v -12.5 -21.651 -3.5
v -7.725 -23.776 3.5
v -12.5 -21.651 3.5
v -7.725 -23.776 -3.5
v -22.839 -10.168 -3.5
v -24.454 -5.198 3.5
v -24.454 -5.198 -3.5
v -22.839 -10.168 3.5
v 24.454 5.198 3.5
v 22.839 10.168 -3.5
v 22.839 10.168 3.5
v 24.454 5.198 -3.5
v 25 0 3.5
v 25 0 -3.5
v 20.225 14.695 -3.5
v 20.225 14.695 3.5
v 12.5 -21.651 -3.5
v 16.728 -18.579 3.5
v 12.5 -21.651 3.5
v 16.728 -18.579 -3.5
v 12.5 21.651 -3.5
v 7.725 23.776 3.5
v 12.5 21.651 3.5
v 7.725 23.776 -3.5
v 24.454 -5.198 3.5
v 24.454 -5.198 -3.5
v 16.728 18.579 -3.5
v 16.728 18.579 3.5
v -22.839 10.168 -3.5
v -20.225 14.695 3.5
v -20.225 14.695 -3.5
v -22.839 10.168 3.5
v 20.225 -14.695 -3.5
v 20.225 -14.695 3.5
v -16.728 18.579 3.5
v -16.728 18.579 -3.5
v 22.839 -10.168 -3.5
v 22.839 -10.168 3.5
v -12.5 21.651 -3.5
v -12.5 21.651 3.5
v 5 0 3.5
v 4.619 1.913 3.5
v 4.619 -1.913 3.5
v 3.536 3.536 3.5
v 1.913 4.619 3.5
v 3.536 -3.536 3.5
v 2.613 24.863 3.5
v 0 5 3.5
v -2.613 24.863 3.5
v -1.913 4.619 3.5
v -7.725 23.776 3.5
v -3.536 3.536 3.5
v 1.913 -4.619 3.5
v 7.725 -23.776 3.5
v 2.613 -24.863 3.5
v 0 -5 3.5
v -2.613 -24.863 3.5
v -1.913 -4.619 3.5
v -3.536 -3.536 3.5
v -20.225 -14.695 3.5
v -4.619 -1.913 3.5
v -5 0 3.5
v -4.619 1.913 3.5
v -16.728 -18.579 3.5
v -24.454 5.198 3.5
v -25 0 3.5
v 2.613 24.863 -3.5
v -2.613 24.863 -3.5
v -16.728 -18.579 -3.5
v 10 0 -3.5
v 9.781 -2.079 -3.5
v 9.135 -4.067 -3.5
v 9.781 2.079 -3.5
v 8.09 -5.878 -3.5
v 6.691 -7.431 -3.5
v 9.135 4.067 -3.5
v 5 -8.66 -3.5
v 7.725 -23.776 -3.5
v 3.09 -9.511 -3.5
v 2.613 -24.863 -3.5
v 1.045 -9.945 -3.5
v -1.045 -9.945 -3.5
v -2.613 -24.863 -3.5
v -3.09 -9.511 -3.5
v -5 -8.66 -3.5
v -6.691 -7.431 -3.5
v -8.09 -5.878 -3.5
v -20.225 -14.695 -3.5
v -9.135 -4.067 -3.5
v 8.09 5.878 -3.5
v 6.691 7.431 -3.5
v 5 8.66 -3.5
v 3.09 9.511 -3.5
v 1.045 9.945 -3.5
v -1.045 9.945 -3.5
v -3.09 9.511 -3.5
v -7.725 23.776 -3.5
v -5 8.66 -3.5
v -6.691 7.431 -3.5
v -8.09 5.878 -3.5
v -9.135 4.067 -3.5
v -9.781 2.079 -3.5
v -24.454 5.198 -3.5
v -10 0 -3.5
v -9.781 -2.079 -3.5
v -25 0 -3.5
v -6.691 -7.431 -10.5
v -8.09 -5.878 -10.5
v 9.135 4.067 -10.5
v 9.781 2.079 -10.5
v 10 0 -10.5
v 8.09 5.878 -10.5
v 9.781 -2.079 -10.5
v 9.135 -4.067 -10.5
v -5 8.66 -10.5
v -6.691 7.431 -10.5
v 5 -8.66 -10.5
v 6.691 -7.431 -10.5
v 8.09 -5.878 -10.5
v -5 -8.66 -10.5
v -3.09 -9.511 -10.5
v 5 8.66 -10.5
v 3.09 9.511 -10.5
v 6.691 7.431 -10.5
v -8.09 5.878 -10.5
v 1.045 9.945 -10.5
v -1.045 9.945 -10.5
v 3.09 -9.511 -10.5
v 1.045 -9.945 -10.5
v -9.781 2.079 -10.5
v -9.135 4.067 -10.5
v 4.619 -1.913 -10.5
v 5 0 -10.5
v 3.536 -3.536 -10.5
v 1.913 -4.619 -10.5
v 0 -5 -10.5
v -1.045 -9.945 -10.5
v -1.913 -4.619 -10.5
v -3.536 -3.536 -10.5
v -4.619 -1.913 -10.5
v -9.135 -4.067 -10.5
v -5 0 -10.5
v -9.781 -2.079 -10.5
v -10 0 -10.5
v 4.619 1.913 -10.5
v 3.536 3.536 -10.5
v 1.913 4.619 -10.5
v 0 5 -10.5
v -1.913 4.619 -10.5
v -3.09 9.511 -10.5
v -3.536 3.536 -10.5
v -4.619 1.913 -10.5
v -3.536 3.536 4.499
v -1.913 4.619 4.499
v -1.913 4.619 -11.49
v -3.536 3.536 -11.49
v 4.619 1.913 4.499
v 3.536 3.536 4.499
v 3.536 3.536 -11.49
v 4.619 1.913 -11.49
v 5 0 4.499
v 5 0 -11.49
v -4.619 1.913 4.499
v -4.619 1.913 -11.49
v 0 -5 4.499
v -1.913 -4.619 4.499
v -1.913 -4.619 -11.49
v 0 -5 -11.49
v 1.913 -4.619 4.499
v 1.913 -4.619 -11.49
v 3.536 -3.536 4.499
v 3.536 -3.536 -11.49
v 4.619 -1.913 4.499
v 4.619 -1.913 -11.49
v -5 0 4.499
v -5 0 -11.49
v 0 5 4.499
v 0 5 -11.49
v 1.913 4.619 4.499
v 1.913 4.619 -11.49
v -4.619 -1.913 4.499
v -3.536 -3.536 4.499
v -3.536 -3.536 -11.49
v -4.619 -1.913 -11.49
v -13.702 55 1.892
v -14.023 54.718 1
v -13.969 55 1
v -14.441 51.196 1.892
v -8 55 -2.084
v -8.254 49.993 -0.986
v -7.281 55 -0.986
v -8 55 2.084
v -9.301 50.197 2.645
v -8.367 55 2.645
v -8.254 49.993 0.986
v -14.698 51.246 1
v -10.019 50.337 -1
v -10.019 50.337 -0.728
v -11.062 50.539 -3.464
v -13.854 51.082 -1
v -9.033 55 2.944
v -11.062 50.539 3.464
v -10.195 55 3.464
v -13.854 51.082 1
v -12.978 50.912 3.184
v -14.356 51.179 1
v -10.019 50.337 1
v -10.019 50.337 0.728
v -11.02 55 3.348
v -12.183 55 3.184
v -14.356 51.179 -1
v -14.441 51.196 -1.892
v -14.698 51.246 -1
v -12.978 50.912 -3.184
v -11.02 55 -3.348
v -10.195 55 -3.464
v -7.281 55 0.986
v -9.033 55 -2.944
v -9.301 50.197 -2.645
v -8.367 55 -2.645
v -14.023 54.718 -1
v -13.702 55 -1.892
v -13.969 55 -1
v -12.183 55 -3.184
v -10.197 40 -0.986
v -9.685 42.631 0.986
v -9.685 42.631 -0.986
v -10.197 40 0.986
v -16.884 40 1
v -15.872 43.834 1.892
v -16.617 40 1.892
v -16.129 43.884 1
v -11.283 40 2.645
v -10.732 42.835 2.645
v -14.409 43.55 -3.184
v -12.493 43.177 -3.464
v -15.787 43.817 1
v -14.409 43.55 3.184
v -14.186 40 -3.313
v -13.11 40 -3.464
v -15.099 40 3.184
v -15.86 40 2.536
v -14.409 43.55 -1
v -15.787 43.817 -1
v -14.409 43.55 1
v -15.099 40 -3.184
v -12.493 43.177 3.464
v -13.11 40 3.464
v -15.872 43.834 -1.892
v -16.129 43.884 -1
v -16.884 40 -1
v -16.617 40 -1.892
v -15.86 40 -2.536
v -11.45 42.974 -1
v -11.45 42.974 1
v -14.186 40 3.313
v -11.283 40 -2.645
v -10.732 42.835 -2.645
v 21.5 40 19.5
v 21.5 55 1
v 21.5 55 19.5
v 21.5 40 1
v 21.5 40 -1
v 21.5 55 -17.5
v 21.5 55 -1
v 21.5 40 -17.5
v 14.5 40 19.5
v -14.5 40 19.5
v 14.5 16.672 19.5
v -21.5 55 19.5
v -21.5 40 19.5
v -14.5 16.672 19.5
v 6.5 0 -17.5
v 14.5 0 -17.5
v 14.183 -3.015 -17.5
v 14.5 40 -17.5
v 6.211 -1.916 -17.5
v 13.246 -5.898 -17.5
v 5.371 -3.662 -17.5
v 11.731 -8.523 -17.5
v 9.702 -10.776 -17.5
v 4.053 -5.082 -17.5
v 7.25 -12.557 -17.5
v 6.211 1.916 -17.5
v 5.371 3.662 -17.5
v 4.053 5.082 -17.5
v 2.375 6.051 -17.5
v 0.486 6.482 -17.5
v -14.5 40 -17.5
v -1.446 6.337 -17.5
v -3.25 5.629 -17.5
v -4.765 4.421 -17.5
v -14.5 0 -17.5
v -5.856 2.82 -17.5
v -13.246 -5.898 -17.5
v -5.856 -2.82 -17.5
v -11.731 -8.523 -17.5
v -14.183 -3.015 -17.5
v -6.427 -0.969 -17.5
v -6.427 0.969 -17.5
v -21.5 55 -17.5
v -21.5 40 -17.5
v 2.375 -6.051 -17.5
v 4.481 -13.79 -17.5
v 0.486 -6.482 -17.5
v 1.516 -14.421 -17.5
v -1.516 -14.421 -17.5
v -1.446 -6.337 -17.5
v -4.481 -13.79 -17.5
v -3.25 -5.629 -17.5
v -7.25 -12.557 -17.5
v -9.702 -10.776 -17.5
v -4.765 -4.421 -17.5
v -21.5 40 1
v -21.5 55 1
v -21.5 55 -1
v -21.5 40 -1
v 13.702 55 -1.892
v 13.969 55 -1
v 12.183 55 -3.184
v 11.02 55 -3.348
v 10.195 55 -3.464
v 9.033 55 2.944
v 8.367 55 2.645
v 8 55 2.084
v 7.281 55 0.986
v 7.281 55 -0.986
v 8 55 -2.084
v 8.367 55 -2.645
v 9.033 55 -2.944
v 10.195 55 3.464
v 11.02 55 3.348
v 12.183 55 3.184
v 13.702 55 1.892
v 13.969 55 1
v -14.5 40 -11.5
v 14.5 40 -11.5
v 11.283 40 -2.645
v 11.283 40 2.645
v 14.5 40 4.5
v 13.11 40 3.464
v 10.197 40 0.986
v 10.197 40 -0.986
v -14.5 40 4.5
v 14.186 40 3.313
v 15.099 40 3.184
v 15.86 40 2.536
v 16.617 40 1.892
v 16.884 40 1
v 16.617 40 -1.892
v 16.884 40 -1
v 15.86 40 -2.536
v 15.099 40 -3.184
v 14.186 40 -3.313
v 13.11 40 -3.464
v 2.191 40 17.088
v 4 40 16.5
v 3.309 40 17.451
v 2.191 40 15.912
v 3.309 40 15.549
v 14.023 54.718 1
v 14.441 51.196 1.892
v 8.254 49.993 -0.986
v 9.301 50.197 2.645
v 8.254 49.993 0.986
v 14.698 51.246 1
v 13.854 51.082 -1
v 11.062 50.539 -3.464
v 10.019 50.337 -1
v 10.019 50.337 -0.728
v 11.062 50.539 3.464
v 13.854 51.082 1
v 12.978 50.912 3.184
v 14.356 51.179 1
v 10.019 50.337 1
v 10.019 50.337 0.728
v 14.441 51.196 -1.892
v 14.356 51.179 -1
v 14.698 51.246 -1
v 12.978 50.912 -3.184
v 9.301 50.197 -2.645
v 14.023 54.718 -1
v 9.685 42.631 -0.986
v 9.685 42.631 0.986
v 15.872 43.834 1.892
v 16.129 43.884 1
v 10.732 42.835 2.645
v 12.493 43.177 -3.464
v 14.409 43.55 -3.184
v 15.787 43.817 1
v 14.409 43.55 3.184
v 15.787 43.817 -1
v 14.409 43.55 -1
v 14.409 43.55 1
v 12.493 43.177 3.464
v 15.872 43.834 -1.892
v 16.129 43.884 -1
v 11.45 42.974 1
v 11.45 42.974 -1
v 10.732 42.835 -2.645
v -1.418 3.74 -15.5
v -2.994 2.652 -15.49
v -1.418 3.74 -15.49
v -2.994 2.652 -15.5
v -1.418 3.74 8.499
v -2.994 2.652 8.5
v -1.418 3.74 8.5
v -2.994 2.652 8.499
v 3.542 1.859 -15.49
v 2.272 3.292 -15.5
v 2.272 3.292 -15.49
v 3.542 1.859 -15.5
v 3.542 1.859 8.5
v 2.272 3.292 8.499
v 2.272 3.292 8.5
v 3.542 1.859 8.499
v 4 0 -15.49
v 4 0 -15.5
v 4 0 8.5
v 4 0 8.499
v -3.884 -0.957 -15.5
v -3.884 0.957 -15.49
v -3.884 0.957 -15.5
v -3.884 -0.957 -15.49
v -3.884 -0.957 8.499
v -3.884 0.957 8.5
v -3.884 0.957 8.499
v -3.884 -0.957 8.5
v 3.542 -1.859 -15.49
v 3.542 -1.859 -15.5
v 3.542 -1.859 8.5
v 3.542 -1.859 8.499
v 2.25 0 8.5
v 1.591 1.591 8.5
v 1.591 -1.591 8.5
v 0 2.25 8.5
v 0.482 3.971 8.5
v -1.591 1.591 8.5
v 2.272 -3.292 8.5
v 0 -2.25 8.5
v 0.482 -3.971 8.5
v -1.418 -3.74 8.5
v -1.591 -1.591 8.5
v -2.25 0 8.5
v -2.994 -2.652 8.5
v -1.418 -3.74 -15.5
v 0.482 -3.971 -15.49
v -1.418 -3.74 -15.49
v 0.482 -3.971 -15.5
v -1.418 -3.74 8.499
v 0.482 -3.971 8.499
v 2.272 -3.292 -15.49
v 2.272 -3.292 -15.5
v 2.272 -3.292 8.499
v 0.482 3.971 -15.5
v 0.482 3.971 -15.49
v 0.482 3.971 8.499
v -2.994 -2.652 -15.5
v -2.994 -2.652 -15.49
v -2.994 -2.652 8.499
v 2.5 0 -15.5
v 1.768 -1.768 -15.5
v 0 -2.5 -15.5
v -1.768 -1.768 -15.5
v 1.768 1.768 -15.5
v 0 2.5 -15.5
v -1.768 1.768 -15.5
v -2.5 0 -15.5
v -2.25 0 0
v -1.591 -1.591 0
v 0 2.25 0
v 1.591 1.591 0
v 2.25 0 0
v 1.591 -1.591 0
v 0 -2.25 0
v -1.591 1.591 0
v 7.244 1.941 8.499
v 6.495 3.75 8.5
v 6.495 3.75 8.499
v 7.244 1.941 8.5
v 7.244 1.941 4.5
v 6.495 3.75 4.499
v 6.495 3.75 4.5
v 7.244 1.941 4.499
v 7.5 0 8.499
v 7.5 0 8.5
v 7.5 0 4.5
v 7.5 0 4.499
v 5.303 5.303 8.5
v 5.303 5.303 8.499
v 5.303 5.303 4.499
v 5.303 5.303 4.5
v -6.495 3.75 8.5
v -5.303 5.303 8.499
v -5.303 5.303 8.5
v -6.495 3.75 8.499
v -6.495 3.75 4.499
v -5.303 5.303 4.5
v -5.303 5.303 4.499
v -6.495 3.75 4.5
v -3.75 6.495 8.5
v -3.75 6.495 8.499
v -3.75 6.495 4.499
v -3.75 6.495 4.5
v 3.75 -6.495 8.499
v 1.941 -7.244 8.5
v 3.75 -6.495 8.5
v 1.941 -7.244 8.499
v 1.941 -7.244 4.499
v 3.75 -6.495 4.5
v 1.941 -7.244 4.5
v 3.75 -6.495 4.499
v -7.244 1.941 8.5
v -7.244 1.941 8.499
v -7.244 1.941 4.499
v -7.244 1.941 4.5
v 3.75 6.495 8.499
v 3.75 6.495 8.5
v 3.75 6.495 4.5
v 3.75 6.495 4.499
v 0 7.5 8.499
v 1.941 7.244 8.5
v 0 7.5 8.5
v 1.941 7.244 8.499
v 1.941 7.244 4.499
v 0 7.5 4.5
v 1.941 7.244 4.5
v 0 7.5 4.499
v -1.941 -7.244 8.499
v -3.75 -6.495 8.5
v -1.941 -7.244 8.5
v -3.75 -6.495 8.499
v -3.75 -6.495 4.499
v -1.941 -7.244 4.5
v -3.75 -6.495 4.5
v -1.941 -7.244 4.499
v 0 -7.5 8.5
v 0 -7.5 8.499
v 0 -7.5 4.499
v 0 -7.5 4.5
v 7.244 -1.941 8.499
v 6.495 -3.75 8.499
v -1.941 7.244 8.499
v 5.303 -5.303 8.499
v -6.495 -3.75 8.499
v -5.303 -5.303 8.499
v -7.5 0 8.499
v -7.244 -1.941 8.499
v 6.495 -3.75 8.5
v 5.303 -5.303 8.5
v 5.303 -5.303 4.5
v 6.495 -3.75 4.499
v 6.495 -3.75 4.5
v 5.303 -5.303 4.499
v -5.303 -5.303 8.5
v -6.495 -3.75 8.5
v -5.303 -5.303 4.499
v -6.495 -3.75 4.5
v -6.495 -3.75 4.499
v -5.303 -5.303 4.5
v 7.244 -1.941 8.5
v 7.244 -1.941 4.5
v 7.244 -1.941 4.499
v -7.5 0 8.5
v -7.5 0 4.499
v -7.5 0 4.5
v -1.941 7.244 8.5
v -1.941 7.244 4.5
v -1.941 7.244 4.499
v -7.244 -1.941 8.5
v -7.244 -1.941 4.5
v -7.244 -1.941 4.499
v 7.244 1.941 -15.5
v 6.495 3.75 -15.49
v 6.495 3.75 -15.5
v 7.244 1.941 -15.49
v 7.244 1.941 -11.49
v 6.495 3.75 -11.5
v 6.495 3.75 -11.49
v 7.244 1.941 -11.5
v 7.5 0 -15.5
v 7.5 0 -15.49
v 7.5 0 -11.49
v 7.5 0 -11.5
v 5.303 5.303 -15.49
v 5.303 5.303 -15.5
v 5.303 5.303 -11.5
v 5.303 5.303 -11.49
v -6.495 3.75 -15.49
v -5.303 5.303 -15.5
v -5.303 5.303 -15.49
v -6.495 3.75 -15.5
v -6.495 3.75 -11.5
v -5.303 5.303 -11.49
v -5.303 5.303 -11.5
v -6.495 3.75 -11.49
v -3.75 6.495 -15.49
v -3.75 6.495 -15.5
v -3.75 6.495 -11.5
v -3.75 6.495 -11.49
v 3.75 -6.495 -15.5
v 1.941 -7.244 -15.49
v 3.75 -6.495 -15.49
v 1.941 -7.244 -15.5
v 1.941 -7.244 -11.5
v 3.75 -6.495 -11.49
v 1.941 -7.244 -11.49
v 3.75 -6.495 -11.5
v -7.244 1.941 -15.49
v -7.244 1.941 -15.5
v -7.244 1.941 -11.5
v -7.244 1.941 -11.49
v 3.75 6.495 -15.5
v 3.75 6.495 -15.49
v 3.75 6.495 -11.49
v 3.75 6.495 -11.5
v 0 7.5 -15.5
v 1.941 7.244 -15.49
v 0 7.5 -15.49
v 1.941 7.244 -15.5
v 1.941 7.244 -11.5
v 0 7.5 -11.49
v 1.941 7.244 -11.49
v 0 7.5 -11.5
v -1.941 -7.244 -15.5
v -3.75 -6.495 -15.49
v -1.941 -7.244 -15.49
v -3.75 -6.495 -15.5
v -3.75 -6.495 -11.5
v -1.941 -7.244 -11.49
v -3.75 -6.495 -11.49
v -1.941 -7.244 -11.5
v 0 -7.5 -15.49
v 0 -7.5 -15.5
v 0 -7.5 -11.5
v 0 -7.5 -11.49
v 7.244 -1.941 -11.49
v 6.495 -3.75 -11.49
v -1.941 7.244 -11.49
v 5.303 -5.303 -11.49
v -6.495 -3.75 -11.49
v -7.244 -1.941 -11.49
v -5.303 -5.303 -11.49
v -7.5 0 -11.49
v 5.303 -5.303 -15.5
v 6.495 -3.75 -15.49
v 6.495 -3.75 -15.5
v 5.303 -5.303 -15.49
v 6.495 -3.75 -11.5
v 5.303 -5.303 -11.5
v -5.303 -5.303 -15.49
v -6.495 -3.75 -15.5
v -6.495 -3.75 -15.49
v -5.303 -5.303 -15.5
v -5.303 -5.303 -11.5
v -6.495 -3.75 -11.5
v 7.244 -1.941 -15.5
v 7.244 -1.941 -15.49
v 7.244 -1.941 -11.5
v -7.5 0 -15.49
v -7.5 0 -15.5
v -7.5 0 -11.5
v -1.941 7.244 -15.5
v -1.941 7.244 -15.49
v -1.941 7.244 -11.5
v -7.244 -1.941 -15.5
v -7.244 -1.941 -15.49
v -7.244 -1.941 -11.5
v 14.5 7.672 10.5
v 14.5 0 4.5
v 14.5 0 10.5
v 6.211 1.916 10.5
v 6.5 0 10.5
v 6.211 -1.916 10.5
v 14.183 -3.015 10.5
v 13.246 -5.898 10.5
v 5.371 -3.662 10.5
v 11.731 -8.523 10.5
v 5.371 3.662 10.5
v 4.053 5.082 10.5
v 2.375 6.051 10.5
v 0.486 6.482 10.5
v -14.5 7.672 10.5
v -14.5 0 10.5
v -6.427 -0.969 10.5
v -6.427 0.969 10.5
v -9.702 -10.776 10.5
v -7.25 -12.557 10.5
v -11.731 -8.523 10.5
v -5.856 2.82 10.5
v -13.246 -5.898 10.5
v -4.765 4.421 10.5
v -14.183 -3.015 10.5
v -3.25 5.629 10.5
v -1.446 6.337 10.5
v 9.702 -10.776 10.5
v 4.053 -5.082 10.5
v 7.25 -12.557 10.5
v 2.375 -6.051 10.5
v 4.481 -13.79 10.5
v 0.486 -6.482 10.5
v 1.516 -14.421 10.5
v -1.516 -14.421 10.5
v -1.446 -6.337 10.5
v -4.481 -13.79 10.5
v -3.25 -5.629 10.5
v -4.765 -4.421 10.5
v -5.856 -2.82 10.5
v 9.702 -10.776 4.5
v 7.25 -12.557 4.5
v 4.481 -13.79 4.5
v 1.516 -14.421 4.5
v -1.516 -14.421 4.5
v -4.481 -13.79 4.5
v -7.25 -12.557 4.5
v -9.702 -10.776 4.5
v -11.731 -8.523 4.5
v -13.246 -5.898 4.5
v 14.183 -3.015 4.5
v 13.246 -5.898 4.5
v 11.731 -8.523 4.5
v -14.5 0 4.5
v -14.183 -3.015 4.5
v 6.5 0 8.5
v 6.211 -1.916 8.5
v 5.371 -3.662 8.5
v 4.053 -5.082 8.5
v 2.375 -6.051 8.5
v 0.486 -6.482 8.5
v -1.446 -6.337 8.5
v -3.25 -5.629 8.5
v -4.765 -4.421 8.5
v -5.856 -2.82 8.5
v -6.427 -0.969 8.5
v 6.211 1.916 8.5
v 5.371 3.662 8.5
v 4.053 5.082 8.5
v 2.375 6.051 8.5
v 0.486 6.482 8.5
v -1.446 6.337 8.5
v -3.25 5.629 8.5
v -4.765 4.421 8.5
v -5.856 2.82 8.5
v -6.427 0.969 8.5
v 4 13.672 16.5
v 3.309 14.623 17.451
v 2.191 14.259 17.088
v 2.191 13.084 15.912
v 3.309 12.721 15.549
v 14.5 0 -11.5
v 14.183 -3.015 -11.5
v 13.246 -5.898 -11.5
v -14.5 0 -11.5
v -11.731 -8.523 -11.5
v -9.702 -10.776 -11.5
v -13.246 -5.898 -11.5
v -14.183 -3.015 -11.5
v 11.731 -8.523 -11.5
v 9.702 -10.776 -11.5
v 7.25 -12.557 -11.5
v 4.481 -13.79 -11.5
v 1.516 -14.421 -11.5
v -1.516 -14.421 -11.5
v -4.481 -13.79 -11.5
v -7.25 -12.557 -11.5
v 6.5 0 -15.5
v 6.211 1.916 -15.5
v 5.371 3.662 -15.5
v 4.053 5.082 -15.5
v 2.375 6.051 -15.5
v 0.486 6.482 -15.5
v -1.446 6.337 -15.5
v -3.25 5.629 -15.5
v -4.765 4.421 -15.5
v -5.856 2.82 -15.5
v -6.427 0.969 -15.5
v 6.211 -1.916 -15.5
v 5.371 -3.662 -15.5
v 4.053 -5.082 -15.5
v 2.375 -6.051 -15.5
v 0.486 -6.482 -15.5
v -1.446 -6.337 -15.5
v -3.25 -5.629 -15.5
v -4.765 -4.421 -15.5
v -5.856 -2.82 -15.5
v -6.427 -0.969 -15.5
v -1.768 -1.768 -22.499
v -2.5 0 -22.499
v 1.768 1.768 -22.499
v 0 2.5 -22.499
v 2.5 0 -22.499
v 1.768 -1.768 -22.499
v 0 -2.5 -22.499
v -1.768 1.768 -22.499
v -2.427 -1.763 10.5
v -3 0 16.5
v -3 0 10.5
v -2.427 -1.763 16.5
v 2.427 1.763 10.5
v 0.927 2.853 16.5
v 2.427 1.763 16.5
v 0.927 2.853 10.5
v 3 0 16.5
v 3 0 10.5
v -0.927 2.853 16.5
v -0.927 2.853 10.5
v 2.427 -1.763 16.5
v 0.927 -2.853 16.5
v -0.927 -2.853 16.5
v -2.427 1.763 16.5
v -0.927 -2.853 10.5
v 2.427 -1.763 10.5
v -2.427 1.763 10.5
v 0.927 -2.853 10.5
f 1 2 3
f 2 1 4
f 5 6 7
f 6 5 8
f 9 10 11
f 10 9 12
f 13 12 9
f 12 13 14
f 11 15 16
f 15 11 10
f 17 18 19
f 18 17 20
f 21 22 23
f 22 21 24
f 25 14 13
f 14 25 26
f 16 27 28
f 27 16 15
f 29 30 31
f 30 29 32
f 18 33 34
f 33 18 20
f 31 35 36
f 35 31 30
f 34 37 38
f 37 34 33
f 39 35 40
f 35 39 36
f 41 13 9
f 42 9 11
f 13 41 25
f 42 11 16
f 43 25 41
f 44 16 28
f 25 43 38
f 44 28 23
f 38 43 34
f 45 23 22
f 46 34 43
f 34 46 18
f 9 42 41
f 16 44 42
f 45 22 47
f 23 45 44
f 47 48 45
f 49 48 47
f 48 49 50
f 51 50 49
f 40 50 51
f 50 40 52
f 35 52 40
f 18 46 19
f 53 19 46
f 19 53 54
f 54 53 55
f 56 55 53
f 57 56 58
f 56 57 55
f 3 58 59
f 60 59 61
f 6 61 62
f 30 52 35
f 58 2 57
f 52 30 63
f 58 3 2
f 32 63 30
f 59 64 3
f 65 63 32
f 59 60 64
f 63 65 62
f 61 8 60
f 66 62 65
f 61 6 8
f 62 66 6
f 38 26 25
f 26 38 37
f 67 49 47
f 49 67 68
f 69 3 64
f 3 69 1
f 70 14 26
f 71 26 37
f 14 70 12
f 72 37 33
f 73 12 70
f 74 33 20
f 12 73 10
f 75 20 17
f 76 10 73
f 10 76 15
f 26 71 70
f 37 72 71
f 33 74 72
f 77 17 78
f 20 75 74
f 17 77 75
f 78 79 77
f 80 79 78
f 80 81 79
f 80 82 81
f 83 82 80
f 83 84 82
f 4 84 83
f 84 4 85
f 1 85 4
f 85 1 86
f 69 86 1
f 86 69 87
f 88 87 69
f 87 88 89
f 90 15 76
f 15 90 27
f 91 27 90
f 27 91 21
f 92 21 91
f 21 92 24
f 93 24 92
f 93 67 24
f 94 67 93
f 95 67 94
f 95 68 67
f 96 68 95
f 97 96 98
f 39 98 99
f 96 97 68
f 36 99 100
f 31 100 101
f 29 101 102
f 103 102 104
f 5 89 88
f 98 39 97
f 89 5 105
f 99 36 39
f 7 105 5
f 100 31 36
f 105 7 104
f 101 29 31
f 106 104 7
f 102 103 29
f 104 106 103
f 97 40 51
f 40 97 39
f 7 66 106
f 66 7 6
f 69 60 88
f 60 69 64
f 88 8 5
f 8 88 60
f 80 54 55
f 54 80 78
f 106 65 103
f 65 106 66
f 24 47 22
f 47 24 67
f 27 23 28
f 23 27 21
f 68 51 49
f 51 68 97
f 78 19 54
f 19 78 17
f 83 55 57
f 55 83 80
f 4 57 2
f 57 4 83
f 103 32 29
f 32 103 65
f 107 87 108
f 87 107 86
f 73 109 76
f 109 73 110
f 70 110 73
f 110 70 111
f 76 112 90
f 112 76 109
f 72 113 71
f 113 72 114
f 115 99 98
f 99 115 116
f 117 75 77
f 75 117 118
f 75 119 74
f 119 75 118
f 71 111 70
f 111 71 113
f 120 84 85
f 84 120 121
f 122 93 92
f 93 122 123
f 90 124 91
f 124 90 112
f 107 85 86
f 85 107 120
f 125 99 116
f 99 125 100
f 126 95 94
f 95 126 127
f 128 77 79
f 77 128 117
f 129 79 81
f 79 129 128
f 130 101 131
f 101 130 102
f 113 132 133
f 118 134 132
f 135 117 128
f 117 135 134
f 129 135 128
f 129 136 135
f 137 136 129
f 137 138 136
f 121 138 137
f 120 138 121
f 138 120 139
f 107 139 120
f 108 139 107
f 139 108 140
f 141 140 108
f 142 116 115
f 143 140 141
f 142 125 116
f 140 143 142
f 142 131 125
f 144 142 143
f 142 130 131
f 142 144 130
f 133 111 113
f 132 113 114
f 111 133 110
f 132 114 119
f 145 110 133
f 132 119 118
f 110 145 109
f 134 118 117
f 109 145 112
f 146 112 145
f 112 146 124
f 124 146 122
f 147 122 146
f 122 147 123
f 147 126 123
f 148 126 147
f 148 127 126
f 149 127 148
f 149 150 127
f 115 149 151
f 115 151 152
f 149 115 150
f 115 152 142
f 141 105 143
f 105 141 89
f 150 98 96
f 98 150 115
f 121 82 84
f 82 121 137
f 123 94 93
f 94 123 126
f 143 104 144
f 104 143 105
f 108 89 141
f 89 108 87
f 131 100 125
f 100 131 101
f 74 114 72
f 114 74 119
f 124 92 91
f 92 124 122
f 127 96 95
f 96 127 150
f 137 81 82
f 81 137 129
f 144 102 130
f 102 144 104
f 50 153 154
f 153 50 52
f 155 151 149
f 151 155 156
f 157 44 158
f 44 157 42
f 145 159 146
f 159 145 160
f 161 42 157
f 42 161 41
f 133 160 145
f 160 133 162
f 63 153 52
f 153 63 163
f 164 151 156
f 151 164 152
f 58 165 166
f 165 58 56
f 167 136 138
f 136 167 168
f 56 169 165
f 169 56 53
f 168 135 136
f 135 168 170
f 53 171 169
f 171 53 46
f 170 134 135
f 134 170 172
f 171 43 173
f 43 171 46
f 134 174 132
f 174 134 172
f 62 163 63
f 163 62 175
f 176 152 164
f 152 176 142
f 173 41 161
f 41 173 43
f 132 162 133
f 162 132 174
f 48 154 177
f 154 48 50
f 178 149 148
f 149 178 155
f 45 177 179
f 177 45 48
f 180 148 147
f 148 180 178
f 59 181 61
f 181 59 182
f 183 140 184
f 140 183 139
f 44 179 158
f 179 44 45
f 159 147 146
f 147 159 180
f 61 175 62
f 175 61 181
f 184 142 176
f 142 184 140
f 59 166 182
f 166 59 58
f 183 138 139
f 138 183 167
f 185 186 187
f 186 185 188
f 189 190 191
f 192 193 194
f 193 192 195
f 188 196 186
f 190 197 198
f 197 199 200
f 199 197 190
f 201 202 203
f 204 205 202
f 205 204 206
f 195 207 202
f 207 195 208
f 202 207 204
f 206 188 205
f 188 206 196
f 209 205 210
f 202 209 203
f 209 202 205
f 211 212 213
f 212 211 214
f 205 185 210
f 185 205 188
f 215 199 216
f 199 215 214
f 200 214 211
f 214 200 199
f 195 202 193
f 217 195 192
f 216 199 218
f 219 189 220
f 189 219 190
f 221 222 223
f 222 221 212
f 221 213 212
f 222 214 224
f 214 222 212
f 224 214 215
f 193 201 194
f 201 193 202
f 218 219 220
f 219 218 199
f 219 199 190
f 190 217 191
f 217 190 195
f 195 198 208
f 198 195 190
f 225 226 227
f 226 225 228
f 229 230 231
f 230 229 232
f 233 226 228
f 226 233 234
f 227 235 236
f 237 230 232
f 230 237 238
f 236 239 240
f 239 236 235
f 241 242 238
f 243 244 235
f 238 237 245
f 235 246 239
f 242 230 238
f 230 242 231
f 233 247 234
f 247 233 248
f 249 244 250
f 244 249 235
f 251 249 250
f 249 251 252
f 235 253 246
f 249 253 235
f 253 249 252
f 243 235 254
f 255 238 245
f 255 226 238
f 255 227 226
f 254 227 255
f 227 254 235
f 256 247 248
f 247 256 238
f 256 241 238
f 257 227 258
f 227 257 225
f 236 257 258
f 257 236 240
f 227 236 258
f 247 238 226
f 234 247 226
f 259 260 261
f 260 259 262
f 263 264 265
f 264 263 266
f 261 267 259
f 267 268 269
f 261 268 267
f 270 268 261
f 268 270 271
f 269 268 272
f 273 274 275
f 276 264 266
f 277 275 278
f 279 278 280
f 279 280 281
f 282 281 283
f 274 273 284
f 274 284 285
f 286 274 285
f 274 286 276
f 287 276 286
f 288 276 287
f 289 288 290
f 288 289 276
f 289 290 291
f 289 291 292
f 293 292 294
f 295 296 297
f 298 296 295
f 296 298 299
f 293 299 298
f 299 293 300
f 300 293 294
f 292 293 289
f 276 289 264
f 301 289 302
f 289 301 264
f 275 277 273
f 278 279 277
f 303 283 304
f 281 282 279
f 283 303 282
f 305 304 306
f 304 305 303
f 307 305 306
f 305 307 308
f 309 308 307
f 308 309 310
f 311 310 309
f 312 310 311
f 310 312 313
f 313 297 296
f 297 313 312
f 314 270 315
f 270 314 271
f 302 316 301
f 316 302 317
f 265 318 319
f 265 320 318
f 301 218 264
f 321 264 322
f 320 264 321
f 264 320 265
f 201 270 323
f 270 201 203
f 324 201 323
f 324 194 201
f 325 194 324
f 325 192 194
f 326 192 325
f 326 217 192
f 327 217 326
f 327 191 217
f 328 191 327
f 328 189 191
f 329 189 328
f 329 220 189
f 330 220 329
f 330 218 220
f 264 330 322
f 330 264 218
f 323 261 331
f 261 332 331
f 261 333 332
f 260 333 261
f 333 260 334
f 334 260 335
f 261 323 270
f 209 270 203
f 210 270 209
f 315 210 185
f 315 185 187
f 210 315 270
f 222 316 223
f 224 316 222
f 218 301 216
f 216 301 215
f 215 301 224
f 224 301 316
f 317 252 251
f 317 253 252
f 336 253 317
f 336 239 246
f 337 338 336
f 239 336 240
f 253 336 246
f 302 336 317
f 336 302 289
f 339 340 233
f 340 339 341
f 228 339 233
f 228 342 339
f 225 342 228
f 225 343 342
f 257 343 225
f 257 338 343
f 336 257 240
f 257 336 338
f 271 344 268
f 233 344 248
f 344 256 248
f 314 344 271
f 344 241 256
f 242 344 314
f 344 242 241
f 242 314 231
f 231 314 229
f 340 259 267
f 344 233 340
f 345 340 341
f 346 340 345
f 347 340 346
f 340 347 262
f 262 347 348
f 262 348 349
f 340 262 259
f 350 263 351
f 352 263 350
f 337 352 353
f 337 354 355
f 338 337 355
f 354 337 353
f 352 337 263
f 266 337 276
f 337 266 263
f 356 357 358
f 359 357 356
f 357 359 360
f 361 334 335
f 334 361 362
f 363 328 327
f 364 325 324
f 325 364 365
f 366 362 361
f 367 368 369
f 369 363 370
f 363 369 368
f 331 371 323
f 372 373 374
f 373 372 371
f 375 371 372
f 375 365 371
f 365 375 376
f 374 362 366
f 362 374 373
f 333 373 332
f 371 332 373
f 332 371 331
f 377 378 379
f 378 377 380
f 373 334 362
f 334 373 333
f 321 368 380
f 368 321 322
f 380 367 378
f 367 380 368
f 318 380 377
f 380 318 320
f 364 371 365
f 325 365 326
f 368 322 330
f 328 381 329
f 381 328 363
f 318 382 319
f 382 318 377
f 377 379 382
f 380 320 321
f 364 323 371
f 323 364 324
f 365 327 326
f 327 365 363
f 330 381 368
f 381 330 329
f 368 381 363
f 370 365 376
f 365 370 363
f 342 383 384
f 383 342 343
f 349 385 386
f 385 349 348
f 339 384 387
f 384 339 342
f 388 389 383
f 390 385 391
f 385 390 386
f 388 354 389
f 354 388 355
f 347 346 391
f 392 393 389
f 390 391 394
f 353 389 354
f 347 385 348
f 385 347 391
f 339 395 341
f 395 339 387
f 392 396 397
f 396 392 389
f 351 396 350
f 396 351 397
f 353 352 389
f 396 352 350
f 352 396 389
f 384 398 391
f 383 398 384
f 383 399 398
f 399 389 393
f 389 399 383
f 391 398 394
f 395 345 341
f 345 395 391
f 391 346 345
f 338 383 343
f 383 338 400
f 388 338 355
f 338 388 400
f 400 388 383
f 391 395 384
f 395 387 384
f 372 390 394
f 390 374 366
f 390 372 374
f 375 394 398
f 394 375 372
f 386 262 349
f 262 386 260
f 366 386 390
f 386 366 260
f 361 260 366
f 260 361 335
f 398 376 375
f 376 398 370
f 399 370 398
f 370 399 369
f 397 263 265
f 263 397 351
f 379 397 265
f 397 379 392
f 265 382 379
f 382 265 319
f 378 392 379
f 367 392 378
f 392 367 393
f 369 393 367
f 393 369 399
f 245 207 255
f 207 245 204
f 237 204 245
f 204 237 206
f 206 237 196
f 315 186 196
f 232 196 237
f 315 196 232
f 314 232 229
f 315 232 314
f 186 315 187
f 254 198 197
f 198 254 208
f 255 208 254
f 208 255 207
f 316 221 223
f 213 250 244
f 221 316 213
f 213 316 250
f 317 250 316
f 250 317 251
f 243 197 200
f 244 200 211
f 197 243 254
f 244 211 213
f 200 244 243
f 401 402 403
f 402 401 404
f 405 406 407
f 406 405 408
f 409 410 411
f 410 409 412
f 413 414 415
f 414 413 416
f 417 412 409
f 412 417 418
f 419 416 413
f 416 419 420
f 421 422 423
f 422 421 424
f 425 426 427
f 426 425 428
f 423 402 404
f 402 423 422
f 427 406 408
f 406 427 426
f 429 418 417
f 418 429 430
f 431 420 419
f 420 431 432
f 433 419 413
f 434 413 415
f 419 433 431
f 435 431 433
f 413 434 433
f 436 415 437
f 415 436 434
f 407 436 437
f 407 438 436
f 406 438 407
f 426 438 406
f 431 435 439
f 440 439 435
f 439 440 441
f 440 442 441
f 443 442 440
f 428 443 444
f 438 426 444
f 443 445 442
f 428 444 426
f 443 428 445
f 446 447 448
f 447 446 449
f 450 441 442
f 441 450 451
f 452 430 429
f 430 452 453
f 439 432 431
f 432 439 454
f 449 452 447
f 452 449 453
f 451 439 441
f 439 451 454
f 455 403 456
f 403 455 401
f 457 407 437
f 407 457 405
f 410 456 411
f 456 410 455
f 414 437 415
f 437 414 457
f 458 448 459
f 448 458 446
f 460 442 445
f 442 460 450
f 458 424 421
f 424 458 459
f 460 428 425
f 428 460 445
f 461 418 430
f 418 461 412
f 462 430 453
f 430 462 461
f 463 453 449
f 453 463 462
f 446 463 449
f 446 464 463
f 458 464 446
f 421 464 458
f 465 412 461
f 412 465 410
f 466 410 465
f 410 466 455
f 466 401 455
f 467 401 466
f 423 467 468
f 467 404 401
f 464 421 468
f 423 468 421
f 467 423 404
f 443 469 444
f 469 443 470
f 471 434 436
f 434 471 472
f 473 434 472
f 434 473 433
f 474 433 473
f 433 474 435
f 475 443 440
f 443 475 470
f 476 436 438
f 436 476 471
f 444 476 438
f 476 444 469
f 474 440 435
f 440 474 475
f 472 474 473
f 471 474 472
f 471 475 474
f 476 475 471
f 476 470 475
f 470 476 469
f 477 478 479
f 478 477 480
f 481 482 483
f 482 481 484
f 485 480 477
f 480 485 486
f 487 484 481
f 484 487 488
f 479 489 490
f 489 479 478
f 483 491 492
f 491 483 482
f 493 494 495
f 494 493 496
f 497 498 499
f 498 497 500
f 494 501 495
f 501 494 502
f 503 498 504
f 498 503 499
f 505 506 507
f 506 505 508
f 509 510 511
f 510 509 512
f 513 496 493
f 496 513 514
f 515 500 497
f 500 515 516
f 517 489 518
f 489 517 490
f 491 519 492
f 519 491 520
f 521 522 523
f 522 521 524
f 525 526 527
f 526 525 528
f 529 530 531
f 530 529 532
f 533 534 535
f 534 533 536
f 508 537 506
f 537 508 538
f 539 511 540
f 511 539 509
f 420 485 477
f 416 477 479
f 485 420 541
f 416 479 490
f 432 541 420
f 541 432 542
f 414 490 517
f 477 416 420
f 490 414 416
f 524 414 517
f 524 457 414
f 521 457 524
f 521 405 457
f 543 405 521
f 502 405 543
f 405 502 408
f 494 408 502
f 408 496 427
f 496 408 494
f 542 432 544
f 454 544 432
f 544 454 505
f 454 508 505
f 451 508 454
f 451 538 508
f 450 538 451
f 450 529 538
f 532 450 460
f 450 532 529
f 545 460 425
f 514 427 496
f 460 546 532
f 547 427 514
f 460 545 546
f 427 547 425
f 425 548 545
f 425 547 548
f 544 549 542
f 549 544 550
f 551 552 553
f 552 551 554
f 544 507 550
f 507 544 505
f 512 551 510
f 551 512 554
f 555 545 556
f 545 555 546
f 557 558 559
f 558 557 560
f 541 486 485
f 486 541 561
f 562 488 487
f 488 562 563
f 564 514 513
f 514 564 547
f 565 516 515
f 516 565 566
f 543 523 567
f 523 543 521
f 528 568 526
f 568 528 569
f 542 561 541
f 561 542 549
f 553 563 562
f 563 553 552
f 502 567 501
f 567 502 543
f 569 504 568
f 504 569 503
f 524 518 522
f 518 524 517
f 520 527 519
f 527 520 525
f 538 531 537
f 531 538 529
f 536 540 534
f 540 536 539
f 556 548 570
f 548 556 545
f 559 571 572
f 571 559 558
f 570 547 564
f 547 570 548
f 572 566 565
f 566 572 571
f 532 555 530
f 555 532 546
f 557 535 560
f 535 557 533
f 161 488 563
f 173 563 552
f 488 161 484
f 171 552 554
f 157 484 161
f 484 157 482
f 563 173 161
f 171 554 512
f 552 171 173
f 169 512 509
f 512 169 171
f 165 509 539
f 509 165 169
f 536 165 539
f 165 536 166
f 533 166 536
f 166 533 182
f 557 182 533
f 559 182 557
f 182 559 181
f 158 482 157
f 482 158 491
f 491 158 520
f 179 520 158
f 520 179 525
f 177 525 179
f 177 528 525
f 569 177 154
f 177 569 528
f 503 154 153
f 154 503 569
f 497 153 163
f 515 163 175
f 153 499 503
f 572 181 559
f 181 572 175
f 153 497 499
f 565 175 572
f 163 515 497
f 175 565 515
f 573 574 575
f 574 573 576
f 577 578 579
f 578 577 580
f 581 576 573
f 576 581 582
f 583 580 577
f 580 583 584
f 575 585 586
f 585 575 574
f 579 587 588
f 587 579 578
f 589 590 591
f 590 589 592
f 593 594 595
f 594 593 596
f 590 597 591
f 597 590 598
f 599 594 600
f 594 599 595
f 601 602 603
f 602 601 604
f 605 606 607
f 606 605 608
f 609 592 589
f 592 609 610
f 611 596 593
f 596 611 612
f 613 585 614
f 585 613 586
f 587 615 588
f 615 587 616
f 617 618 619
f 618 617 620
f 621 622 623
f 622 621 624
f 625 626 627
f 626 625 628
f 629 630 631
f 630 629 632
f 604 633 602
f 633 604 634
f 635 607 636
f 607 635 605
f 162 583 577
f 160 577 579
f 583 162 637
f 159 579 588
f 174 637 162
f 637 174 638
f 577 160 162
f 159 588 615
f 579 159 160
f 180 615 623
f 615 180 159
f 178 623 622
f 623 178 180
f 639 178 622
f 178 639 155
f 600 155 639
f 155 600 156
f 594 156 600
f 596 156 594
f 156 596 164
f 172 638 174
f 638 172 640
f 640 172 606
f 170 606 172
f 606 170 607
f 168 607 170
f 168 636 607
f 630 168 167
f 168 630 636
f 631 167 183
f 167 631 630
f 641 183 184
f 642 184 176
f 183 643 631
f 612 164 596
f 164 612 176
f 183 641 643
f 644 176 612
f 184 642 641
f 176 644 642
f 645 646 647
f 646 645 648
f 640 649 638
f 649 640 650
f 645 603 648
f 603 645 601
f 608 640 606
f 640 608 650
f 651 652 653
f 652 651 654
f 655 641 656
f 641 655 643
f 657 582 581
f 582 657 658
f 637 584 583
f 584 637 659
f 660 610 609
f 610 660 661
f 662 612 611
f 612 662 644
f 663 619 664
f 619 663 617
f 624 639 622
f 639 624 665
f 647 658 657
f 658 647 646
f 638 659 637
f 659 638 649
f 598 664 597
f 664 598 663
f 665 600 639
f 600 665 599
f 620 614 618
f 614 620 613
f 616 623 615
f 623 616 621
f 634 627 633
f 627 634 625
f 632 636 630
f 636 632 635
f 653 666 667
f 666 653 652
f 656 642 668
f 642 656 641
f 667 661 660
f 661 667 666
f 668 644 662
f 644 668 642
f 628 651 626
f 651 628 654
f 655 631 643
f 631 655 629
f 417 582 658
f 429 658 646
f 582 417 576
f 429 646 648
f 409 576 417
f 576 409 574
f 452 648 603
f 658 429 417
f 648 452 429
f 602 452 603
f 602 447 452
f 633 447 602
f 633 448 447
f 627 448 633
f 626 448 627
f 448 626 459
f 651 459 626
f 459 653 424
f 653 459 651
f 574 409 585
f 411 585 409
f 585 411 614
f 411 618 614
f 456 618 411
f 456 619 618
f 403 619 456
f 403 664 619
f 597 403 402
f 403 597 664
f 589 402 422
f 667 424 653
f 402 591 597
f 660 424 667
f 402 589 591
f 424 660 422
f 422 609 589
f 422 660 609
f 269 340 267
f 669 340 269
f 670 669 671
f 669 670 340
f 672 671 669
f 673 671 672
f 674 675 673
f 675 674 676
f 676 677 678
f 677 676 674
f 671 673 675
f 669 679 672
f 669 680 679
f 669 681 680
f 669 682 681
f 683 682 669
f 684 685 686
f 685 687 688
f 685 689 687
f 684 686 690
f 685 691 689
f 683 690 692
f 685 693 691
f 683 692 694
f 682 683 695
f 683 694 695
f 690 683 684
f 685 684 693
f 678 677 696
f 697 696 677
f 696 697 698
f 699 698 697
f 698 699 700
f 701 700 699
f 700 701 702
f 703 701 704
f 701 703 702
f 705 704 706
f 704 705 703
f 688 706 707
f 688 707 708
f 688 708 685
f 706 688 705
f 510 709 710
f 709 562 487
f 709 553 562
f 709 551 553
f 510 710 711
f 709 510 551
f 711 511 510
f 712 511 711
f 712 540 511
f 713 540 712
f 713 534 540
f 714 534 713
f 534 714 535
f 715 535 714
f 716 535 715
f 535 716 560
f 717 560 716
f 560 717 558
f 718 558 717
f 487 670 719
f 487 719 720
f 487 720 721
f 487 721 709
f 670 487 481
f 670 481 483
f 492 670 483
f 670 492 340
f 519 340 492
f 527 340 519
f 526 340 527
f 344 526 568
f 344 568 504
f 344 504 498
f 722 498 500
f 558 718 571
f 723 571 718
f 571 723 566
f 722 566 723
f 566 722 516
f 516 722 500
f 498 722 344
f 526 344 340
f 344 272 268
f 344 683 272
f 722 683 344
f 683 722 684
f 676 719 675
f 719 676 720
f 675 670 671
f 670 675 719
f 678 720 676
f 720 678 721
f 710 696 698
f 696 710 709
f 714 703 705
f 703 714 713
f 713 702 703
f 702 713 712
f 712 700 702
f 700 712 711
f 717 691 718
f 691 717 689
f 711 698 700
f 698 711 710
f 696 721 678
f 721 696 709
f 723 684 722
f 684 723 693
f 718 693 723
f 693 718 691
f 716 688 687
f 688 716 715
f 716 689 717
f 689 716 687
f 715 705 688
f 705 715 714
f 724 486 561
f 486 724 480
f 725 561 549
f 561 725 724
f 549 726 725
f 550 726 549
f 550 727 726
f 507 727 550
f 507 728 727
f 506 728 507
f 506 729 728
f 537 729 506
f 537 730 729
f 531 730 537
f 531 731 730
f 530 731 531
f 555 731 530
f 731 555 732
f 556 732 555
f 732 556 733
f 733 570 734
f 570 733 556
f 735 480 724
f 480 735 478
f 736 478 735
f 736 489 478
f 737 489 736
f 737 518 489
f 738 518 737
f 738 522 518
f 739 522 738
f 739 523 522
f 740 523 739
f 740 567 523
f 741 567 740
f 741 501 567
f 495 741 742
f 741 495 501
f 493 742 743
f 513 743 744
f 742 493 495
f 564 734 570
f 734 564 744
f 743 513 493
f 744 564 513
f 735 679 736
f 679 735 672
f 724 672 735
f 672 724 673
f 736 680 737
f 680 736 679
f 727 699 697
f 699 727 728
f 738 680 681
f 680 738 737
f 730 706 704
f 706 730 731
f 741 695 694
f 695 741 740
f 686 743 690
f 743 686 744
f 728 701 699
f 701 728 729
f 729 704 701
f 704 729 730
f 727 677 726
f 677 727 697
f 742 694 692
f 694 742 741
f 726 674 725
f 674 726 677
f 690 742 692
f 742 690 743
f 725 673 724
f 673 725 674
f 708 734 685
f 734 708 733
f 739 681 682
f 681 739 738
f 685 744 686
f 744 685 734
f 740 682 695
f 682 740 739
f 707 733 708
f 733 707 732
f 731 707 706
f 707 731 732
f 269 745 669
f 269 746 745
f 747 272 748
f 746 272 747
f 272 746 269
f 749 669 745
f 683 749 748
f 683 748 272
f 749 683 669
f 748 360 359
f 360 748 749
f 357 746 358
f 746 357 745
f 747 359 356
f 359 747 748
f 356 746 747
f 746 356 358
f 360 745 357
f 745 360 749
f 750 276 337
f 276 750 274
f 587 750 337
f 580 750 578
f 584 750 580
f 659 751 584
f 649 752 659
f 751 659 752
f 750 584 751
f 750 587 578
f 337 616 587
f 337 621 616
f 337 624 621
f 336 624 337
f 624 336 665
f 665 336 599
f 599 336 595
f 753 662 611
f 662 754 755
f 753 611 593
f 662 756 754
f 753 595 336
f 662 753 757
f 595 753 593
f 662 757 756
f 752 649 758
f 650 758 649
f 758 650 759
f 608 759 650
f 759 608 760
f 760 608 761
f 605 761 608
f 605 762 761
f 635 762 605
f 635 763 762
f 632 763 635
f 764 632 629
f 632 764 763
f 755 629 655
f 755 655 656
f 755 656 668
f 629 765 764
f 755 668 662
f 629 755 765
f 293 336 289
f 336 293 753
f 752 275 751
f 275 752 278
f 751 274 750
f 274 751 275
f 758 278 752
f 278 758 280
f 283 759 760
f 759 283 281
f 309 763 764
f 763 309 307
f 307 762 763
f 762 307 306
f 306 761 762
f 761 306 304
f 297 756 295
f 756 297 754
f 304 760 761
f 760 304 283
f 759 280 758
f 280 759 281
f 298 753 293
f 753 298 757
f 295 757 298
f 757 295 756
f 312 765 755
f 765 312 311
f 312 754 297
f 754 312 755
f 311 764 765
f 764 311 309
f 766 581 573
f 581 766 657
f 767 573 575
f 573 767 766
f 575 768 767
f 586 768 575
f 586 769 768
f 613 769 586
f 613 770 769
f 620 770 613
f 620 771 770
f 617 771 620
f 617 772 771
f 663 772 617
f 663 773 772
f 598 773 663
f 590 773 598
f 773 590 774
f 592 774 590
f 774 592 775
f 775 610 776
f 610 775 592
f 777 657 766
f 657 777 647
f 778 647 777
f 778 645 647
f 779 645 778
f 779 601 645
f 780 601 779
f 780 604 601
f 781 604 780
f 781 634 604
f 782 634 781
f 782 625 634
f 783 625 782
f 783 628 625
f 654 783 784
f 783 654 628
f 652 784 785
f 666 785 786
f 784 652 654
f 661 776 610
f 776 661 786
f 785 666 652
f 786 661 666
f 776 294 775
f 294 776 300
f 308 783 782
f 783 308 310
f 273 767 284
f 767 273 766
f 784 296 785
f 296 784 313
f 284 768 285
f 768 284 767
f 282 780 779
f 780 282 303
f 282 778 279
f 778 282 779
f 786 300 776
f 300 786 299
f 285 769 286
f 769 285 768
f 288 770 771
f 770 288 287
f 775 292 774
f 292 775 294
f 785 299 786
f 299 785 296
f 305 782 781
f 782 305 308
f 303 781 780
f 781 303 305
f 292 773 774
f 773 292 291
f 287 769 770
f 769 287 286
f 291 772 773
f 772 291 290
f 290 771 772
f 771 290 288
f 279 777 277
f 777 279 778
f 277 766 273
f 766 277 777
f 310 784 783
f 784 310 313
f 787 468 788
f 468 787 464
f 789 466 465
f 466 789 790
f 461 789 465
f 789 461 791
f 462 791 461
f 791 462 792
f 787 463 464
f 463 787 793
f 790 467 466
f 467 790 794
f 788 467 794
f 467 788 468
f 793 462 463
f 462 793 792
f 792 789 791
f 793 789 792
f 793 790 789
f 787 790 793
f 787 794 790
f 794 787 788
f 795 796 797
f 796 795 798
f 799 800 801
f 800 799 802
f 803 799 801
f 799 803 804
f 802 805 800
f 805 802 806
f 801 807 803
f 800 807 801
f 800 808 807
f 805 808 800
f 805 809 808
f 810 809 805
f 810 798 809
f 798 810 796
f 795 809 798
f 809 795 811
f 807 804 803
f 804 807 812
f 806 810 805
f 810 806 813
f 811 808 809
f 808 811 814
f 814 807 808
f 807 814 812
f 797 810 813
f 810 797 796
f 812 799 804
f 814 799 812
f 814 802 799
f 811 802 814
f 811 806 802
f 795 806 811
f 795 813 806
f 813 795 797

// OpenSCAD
screwInsertHoleDiameter = 4.5;

throttleCablePulleyDiameter = 50;
throttleCablePulleyWidth = 7;
throttleCablePulleyAxleDiameter = 10;
throttleCablePulleyAxleExtraHeight = 7;
throttleCablePulleyAxleExtraHeightDiameter = 20;

//pulley
color("grey") difference() {
  union() {
    translate([0,0,-throttleCablePulleyWidth/2]) cylinder(h=throttleCablePulleyWidth, r=throttleCablePulleyDiameter/2);
    translate([0,0,-throttleCablePulleyWidth/2 - throttleCablePulleyAxleExtraHeight]) cylinder(h=throttleCablePulleyWidth+throttleCablePulleyAxleExtraHeight, r=throttleCablePulleyAxleExtraHeightDiameter/2);

  }
  translate([0,0,-throttleCablePulleyWidth/2 - 5]) cylinder(h=throttleCablePulleyWidth + throttleCablePulleyAxleExtraHeight + 10, r=throttleCablePulleyAxleDiameter/2);

}

//cable holders
springHeight = 6;
bearingHeight = 4;
bearingHolderEdgeThickness = 2;
springHolderWireMargin = 3;

throttleCableStopWidth = 43;
throttleCableStopDistance = 40;
throttleCableStopHeight = 15;

throttleCableStopDepth = 100 - (100 - springHeight - 1 - springHolderWireMargin) + 6 + throttleCablePulleyWidth + throttleCablePulleyAxleExtraHeight+ 1+ bearingHeight + bearingHolderEdgeThickness;




difference() {
  translate([-throttleCableStopWidth/2,throttleCableStopDistance,-throttleCableStopDepth + throttleCablePulleyWidth/2 + bearingHeight + bearingHolderEdgeThickness+springHeight + springHolderWireMargin + 1]) cube([throttleCableStopWidth,throttleCableStopHeight,throttleCableStopDepth]);

  innerThrottleCableDiameter = 2;
  outerThrottleCableDiameter = 7;
  throttleCableEntranceAngle = 11;
  throttleCableMargin = 21;
  throttleCableSlotMargin = 13;

  #rotate([90,0,throttleCableEntranceAngle]) translate([throttleCableMargin,0,-throttleCableStopDistance - throttleCableStopHeight ]) cylinder(h=throttleCableStopHeight + 100, r=innerThrottleCableDiameter/2);
  mirror([1,0]) {
    #rotate([90,0,throttleCableEntranceAngle]) translate([throttleCableMargin,0,-throttleCableStopDistance - throttleCableStopHeight ]) cylinder(h=throttleCableStopHeight + 100, r=innerThrottleCableDiameter/2);
  }

  rotate([90,0,throttleCableEntranceAngle]) translate([throttleCableMargin,0,-throttleCableStopDistance - throttleCableStopHeight ]) cylinder(h=throttleCableStopHeight/2, r=outerThrottleCableDiameter/2);
  rotate([90,0,throttleCableEntranceAngle]) translate([throttleCableMargin,0,-throttleCableStopDistance ]) cylinder(h=throttleCableStopHeight/2, r=outerThrottleCableDiameter/2);
  mirror([1,0]) {
    rotate([90,0,throttleCableEntranceAngle]) translate([throttleCableMargin,0,-throttleCableStopDistance - throttleCableStopHeight ]) cylinder(h=throttleCableStopHeight/2, r=outerThrottleCableDiameter/2);
    rotate([90,0,throttleCableEntranceAngle]) translate([throttleCableMargin,0,-throttleCableStopDistance ]) cylinder(h=throttleCableStopHeight/2, r=outerThrottleCableDiameter/2);

  }

  translate([throttleCableSlotMargin,throttleCableStopDistance - 5,-innerThrottleCableDiameter/2]) rotate([0,0,throttleCableEntranceAngle]) cube([20, throttleCableStopHeight + 10, innerThrottleCableDiameter]);
  mirror([1,0]){
    translate([throttleCableSlotMargin,throttleCableStopDistance - 5,-innerThrottleCableDiameter/2]) rotate([0,0,throttleCableEntranceAngle]) cube([20, throttleCableStopHeight + 10, innerThrottleCableDiameter]);
  }
}

module bearing() {
  color("grey") difference() {
    cylinder(h = bearingHeight, r = bearingOuterDiameter/2);
    translate([0,0,-1]) cylinder(h = bearingHeight + 2, r = bearingAxleDiameter/2);
  }
}


//axle
axleHeight = throttleCablePulleyWidth + throttleCablePulleyAxleExtraHeight + 2;
bearingAxleDiameter = 8;
bearingOuterDiameter = 15;

difference() {
  union() {
    translate([0,0,-throttleCablePulleyAxleExtraHeight - throttleCablePulleyWidth/2 - 1]) cylinder(h=axleHeight, r=throttleCablePulleyAxleDiameter/2);
    translate([0,0,-throttleCablePulleyAxleExtraHeight - throttleCablePulleyWidth/2 - 1 - bearingHeight]) cylinder(h=axleHeight + bearingHeight*2, r=bearingAxleDiameter/2);
  }
  translate([0,0,0]) cylinder(h=100, r=screwInsertHoleDiameter/2);

}
sensorAxleDiameter = 5;
sensorAxleHeight = bearingHolderEdgeThickness + 5;
translate([0,0,-sensorAxleHeight - throttleCablePulleyWidth/2 - throttleCablePulleyAxleExtraHeight - 1 - bearingHeight + 0.001]) cylinder(h=sensorAxleHeight, r=sensorAxleDiameter/2);

translate([0,0,throttleCablePulleyWidth/2 + 1 - 0.001]) bearing();
translate([0,0,-bearingHeight - throttleCablePulleyWidth/2 - throttleCablePulleyAxleExtraHeight - 1 + 0.01]) bearing();

//spring
springDiameter = 6;
springBearingMargin = 2;
color("grey") translate([0,0,throttleCablePulleyWidth/2 + 1 + bearingHeight+ springBearingMargin]) cylinder(h=springHeight, r=springDiameter/2);

//bearing holder
holderMargin = 7;
bearingHolderEdgeWidth = 2;
difference() {
  union() {
    translate([-(bearingOuterDiameter + holderMargin * 2)/2,0,throttleCablePulleyWidth/2+1]) cube([bearingOuterDiameter + holderMargin * 2,throttleCableStopDistance  + throttleCableStopHeight,bearingHeight + bearingHolderEdgeThickness]);
    translate([0,0,throttleCablePulleyWidth/2 + 1]) cylinder(h = bearingHeight + bearingHolderEdgeThickness, r = bearingOuterDiameter/2 + holderMargin);
  }
  translate([0,0,throttleCablePulleyWidth/2]) cylinder(h = bearingHeight + 1, r = bearingOuterDiameter/2);
  translate([0,0,throttleCablePulleyWidth/2]) cylinder(h = bearingHeight + 1 + bearingHolderEdgeThickness + 0.01, r = (bearingOuterDiameter - bearingHolderEdgeWidth)/2);

}
springHolderWidth = bearingOuterDiameter + holderMargin * 2;
springHolderlength = throttleCableStopDistance +  throttleCableStopHeight;
springHolderHoleDistance = 15;
difference() {
  difference() {
    translate([-springHolderWidth/2,0,throttleCablePulleyWidth/2+1+bearingHeight+ bearingHolderEdgeThickness]) cube([springHolderWidth,springHolderlength,springHeight+springHolderWireMargin]);
    rotate([45,0,0]) translate([-50,-10,2]) cube([100,100,100]);
  }
  rotate([90,0,0]) translate([springDiameter/2,throttleCablePulleyWidth/2+1+bearingHeight+bearingHolderEdgeThickness+springHeight,-100]) cylinder(h=100, r=1);
}

translate([0,0,-1-throttleCablePulleyWidth - throttleCablePulleyAxleExtraHeight - 1 - bearingHeight - bearingHolderEdgeThickness]) difference() {
  union() {
    translate([-(bearingOuterDiameter + holderMargin * 2)/2,0,throttleCablePulleyWidth/2+1]) cube([bearingOuterDiameter + holderMargin * 2,throttleCableStopDistance  + throttleCableStopHeight,bearingHeight + bearingHolderEdgeThickness]);
    translate([0,0,throttleCablePulleyWidth/2 + 1]) cylinder(h = bearingHeight + bearingHolderEdgeThickness, r = bearingOuterDiameter/2 + holderMargin);
  }
  translate([0,0,throttleCablePulleyWidth/2 + bearingHolderEdgeThickness + 1]) cylinder(h = bearingHeight + 1, r = bearingOuterDiameter/2);
  translate([0,0,throttleCablePulleyWidth/2]) cylinder(h = bearingHeight + 1 + bearingHolderEdgeThickness + 0.01, r = (bearingOuterDiameter - bearingHolderEdgeWidth)/2);

}
